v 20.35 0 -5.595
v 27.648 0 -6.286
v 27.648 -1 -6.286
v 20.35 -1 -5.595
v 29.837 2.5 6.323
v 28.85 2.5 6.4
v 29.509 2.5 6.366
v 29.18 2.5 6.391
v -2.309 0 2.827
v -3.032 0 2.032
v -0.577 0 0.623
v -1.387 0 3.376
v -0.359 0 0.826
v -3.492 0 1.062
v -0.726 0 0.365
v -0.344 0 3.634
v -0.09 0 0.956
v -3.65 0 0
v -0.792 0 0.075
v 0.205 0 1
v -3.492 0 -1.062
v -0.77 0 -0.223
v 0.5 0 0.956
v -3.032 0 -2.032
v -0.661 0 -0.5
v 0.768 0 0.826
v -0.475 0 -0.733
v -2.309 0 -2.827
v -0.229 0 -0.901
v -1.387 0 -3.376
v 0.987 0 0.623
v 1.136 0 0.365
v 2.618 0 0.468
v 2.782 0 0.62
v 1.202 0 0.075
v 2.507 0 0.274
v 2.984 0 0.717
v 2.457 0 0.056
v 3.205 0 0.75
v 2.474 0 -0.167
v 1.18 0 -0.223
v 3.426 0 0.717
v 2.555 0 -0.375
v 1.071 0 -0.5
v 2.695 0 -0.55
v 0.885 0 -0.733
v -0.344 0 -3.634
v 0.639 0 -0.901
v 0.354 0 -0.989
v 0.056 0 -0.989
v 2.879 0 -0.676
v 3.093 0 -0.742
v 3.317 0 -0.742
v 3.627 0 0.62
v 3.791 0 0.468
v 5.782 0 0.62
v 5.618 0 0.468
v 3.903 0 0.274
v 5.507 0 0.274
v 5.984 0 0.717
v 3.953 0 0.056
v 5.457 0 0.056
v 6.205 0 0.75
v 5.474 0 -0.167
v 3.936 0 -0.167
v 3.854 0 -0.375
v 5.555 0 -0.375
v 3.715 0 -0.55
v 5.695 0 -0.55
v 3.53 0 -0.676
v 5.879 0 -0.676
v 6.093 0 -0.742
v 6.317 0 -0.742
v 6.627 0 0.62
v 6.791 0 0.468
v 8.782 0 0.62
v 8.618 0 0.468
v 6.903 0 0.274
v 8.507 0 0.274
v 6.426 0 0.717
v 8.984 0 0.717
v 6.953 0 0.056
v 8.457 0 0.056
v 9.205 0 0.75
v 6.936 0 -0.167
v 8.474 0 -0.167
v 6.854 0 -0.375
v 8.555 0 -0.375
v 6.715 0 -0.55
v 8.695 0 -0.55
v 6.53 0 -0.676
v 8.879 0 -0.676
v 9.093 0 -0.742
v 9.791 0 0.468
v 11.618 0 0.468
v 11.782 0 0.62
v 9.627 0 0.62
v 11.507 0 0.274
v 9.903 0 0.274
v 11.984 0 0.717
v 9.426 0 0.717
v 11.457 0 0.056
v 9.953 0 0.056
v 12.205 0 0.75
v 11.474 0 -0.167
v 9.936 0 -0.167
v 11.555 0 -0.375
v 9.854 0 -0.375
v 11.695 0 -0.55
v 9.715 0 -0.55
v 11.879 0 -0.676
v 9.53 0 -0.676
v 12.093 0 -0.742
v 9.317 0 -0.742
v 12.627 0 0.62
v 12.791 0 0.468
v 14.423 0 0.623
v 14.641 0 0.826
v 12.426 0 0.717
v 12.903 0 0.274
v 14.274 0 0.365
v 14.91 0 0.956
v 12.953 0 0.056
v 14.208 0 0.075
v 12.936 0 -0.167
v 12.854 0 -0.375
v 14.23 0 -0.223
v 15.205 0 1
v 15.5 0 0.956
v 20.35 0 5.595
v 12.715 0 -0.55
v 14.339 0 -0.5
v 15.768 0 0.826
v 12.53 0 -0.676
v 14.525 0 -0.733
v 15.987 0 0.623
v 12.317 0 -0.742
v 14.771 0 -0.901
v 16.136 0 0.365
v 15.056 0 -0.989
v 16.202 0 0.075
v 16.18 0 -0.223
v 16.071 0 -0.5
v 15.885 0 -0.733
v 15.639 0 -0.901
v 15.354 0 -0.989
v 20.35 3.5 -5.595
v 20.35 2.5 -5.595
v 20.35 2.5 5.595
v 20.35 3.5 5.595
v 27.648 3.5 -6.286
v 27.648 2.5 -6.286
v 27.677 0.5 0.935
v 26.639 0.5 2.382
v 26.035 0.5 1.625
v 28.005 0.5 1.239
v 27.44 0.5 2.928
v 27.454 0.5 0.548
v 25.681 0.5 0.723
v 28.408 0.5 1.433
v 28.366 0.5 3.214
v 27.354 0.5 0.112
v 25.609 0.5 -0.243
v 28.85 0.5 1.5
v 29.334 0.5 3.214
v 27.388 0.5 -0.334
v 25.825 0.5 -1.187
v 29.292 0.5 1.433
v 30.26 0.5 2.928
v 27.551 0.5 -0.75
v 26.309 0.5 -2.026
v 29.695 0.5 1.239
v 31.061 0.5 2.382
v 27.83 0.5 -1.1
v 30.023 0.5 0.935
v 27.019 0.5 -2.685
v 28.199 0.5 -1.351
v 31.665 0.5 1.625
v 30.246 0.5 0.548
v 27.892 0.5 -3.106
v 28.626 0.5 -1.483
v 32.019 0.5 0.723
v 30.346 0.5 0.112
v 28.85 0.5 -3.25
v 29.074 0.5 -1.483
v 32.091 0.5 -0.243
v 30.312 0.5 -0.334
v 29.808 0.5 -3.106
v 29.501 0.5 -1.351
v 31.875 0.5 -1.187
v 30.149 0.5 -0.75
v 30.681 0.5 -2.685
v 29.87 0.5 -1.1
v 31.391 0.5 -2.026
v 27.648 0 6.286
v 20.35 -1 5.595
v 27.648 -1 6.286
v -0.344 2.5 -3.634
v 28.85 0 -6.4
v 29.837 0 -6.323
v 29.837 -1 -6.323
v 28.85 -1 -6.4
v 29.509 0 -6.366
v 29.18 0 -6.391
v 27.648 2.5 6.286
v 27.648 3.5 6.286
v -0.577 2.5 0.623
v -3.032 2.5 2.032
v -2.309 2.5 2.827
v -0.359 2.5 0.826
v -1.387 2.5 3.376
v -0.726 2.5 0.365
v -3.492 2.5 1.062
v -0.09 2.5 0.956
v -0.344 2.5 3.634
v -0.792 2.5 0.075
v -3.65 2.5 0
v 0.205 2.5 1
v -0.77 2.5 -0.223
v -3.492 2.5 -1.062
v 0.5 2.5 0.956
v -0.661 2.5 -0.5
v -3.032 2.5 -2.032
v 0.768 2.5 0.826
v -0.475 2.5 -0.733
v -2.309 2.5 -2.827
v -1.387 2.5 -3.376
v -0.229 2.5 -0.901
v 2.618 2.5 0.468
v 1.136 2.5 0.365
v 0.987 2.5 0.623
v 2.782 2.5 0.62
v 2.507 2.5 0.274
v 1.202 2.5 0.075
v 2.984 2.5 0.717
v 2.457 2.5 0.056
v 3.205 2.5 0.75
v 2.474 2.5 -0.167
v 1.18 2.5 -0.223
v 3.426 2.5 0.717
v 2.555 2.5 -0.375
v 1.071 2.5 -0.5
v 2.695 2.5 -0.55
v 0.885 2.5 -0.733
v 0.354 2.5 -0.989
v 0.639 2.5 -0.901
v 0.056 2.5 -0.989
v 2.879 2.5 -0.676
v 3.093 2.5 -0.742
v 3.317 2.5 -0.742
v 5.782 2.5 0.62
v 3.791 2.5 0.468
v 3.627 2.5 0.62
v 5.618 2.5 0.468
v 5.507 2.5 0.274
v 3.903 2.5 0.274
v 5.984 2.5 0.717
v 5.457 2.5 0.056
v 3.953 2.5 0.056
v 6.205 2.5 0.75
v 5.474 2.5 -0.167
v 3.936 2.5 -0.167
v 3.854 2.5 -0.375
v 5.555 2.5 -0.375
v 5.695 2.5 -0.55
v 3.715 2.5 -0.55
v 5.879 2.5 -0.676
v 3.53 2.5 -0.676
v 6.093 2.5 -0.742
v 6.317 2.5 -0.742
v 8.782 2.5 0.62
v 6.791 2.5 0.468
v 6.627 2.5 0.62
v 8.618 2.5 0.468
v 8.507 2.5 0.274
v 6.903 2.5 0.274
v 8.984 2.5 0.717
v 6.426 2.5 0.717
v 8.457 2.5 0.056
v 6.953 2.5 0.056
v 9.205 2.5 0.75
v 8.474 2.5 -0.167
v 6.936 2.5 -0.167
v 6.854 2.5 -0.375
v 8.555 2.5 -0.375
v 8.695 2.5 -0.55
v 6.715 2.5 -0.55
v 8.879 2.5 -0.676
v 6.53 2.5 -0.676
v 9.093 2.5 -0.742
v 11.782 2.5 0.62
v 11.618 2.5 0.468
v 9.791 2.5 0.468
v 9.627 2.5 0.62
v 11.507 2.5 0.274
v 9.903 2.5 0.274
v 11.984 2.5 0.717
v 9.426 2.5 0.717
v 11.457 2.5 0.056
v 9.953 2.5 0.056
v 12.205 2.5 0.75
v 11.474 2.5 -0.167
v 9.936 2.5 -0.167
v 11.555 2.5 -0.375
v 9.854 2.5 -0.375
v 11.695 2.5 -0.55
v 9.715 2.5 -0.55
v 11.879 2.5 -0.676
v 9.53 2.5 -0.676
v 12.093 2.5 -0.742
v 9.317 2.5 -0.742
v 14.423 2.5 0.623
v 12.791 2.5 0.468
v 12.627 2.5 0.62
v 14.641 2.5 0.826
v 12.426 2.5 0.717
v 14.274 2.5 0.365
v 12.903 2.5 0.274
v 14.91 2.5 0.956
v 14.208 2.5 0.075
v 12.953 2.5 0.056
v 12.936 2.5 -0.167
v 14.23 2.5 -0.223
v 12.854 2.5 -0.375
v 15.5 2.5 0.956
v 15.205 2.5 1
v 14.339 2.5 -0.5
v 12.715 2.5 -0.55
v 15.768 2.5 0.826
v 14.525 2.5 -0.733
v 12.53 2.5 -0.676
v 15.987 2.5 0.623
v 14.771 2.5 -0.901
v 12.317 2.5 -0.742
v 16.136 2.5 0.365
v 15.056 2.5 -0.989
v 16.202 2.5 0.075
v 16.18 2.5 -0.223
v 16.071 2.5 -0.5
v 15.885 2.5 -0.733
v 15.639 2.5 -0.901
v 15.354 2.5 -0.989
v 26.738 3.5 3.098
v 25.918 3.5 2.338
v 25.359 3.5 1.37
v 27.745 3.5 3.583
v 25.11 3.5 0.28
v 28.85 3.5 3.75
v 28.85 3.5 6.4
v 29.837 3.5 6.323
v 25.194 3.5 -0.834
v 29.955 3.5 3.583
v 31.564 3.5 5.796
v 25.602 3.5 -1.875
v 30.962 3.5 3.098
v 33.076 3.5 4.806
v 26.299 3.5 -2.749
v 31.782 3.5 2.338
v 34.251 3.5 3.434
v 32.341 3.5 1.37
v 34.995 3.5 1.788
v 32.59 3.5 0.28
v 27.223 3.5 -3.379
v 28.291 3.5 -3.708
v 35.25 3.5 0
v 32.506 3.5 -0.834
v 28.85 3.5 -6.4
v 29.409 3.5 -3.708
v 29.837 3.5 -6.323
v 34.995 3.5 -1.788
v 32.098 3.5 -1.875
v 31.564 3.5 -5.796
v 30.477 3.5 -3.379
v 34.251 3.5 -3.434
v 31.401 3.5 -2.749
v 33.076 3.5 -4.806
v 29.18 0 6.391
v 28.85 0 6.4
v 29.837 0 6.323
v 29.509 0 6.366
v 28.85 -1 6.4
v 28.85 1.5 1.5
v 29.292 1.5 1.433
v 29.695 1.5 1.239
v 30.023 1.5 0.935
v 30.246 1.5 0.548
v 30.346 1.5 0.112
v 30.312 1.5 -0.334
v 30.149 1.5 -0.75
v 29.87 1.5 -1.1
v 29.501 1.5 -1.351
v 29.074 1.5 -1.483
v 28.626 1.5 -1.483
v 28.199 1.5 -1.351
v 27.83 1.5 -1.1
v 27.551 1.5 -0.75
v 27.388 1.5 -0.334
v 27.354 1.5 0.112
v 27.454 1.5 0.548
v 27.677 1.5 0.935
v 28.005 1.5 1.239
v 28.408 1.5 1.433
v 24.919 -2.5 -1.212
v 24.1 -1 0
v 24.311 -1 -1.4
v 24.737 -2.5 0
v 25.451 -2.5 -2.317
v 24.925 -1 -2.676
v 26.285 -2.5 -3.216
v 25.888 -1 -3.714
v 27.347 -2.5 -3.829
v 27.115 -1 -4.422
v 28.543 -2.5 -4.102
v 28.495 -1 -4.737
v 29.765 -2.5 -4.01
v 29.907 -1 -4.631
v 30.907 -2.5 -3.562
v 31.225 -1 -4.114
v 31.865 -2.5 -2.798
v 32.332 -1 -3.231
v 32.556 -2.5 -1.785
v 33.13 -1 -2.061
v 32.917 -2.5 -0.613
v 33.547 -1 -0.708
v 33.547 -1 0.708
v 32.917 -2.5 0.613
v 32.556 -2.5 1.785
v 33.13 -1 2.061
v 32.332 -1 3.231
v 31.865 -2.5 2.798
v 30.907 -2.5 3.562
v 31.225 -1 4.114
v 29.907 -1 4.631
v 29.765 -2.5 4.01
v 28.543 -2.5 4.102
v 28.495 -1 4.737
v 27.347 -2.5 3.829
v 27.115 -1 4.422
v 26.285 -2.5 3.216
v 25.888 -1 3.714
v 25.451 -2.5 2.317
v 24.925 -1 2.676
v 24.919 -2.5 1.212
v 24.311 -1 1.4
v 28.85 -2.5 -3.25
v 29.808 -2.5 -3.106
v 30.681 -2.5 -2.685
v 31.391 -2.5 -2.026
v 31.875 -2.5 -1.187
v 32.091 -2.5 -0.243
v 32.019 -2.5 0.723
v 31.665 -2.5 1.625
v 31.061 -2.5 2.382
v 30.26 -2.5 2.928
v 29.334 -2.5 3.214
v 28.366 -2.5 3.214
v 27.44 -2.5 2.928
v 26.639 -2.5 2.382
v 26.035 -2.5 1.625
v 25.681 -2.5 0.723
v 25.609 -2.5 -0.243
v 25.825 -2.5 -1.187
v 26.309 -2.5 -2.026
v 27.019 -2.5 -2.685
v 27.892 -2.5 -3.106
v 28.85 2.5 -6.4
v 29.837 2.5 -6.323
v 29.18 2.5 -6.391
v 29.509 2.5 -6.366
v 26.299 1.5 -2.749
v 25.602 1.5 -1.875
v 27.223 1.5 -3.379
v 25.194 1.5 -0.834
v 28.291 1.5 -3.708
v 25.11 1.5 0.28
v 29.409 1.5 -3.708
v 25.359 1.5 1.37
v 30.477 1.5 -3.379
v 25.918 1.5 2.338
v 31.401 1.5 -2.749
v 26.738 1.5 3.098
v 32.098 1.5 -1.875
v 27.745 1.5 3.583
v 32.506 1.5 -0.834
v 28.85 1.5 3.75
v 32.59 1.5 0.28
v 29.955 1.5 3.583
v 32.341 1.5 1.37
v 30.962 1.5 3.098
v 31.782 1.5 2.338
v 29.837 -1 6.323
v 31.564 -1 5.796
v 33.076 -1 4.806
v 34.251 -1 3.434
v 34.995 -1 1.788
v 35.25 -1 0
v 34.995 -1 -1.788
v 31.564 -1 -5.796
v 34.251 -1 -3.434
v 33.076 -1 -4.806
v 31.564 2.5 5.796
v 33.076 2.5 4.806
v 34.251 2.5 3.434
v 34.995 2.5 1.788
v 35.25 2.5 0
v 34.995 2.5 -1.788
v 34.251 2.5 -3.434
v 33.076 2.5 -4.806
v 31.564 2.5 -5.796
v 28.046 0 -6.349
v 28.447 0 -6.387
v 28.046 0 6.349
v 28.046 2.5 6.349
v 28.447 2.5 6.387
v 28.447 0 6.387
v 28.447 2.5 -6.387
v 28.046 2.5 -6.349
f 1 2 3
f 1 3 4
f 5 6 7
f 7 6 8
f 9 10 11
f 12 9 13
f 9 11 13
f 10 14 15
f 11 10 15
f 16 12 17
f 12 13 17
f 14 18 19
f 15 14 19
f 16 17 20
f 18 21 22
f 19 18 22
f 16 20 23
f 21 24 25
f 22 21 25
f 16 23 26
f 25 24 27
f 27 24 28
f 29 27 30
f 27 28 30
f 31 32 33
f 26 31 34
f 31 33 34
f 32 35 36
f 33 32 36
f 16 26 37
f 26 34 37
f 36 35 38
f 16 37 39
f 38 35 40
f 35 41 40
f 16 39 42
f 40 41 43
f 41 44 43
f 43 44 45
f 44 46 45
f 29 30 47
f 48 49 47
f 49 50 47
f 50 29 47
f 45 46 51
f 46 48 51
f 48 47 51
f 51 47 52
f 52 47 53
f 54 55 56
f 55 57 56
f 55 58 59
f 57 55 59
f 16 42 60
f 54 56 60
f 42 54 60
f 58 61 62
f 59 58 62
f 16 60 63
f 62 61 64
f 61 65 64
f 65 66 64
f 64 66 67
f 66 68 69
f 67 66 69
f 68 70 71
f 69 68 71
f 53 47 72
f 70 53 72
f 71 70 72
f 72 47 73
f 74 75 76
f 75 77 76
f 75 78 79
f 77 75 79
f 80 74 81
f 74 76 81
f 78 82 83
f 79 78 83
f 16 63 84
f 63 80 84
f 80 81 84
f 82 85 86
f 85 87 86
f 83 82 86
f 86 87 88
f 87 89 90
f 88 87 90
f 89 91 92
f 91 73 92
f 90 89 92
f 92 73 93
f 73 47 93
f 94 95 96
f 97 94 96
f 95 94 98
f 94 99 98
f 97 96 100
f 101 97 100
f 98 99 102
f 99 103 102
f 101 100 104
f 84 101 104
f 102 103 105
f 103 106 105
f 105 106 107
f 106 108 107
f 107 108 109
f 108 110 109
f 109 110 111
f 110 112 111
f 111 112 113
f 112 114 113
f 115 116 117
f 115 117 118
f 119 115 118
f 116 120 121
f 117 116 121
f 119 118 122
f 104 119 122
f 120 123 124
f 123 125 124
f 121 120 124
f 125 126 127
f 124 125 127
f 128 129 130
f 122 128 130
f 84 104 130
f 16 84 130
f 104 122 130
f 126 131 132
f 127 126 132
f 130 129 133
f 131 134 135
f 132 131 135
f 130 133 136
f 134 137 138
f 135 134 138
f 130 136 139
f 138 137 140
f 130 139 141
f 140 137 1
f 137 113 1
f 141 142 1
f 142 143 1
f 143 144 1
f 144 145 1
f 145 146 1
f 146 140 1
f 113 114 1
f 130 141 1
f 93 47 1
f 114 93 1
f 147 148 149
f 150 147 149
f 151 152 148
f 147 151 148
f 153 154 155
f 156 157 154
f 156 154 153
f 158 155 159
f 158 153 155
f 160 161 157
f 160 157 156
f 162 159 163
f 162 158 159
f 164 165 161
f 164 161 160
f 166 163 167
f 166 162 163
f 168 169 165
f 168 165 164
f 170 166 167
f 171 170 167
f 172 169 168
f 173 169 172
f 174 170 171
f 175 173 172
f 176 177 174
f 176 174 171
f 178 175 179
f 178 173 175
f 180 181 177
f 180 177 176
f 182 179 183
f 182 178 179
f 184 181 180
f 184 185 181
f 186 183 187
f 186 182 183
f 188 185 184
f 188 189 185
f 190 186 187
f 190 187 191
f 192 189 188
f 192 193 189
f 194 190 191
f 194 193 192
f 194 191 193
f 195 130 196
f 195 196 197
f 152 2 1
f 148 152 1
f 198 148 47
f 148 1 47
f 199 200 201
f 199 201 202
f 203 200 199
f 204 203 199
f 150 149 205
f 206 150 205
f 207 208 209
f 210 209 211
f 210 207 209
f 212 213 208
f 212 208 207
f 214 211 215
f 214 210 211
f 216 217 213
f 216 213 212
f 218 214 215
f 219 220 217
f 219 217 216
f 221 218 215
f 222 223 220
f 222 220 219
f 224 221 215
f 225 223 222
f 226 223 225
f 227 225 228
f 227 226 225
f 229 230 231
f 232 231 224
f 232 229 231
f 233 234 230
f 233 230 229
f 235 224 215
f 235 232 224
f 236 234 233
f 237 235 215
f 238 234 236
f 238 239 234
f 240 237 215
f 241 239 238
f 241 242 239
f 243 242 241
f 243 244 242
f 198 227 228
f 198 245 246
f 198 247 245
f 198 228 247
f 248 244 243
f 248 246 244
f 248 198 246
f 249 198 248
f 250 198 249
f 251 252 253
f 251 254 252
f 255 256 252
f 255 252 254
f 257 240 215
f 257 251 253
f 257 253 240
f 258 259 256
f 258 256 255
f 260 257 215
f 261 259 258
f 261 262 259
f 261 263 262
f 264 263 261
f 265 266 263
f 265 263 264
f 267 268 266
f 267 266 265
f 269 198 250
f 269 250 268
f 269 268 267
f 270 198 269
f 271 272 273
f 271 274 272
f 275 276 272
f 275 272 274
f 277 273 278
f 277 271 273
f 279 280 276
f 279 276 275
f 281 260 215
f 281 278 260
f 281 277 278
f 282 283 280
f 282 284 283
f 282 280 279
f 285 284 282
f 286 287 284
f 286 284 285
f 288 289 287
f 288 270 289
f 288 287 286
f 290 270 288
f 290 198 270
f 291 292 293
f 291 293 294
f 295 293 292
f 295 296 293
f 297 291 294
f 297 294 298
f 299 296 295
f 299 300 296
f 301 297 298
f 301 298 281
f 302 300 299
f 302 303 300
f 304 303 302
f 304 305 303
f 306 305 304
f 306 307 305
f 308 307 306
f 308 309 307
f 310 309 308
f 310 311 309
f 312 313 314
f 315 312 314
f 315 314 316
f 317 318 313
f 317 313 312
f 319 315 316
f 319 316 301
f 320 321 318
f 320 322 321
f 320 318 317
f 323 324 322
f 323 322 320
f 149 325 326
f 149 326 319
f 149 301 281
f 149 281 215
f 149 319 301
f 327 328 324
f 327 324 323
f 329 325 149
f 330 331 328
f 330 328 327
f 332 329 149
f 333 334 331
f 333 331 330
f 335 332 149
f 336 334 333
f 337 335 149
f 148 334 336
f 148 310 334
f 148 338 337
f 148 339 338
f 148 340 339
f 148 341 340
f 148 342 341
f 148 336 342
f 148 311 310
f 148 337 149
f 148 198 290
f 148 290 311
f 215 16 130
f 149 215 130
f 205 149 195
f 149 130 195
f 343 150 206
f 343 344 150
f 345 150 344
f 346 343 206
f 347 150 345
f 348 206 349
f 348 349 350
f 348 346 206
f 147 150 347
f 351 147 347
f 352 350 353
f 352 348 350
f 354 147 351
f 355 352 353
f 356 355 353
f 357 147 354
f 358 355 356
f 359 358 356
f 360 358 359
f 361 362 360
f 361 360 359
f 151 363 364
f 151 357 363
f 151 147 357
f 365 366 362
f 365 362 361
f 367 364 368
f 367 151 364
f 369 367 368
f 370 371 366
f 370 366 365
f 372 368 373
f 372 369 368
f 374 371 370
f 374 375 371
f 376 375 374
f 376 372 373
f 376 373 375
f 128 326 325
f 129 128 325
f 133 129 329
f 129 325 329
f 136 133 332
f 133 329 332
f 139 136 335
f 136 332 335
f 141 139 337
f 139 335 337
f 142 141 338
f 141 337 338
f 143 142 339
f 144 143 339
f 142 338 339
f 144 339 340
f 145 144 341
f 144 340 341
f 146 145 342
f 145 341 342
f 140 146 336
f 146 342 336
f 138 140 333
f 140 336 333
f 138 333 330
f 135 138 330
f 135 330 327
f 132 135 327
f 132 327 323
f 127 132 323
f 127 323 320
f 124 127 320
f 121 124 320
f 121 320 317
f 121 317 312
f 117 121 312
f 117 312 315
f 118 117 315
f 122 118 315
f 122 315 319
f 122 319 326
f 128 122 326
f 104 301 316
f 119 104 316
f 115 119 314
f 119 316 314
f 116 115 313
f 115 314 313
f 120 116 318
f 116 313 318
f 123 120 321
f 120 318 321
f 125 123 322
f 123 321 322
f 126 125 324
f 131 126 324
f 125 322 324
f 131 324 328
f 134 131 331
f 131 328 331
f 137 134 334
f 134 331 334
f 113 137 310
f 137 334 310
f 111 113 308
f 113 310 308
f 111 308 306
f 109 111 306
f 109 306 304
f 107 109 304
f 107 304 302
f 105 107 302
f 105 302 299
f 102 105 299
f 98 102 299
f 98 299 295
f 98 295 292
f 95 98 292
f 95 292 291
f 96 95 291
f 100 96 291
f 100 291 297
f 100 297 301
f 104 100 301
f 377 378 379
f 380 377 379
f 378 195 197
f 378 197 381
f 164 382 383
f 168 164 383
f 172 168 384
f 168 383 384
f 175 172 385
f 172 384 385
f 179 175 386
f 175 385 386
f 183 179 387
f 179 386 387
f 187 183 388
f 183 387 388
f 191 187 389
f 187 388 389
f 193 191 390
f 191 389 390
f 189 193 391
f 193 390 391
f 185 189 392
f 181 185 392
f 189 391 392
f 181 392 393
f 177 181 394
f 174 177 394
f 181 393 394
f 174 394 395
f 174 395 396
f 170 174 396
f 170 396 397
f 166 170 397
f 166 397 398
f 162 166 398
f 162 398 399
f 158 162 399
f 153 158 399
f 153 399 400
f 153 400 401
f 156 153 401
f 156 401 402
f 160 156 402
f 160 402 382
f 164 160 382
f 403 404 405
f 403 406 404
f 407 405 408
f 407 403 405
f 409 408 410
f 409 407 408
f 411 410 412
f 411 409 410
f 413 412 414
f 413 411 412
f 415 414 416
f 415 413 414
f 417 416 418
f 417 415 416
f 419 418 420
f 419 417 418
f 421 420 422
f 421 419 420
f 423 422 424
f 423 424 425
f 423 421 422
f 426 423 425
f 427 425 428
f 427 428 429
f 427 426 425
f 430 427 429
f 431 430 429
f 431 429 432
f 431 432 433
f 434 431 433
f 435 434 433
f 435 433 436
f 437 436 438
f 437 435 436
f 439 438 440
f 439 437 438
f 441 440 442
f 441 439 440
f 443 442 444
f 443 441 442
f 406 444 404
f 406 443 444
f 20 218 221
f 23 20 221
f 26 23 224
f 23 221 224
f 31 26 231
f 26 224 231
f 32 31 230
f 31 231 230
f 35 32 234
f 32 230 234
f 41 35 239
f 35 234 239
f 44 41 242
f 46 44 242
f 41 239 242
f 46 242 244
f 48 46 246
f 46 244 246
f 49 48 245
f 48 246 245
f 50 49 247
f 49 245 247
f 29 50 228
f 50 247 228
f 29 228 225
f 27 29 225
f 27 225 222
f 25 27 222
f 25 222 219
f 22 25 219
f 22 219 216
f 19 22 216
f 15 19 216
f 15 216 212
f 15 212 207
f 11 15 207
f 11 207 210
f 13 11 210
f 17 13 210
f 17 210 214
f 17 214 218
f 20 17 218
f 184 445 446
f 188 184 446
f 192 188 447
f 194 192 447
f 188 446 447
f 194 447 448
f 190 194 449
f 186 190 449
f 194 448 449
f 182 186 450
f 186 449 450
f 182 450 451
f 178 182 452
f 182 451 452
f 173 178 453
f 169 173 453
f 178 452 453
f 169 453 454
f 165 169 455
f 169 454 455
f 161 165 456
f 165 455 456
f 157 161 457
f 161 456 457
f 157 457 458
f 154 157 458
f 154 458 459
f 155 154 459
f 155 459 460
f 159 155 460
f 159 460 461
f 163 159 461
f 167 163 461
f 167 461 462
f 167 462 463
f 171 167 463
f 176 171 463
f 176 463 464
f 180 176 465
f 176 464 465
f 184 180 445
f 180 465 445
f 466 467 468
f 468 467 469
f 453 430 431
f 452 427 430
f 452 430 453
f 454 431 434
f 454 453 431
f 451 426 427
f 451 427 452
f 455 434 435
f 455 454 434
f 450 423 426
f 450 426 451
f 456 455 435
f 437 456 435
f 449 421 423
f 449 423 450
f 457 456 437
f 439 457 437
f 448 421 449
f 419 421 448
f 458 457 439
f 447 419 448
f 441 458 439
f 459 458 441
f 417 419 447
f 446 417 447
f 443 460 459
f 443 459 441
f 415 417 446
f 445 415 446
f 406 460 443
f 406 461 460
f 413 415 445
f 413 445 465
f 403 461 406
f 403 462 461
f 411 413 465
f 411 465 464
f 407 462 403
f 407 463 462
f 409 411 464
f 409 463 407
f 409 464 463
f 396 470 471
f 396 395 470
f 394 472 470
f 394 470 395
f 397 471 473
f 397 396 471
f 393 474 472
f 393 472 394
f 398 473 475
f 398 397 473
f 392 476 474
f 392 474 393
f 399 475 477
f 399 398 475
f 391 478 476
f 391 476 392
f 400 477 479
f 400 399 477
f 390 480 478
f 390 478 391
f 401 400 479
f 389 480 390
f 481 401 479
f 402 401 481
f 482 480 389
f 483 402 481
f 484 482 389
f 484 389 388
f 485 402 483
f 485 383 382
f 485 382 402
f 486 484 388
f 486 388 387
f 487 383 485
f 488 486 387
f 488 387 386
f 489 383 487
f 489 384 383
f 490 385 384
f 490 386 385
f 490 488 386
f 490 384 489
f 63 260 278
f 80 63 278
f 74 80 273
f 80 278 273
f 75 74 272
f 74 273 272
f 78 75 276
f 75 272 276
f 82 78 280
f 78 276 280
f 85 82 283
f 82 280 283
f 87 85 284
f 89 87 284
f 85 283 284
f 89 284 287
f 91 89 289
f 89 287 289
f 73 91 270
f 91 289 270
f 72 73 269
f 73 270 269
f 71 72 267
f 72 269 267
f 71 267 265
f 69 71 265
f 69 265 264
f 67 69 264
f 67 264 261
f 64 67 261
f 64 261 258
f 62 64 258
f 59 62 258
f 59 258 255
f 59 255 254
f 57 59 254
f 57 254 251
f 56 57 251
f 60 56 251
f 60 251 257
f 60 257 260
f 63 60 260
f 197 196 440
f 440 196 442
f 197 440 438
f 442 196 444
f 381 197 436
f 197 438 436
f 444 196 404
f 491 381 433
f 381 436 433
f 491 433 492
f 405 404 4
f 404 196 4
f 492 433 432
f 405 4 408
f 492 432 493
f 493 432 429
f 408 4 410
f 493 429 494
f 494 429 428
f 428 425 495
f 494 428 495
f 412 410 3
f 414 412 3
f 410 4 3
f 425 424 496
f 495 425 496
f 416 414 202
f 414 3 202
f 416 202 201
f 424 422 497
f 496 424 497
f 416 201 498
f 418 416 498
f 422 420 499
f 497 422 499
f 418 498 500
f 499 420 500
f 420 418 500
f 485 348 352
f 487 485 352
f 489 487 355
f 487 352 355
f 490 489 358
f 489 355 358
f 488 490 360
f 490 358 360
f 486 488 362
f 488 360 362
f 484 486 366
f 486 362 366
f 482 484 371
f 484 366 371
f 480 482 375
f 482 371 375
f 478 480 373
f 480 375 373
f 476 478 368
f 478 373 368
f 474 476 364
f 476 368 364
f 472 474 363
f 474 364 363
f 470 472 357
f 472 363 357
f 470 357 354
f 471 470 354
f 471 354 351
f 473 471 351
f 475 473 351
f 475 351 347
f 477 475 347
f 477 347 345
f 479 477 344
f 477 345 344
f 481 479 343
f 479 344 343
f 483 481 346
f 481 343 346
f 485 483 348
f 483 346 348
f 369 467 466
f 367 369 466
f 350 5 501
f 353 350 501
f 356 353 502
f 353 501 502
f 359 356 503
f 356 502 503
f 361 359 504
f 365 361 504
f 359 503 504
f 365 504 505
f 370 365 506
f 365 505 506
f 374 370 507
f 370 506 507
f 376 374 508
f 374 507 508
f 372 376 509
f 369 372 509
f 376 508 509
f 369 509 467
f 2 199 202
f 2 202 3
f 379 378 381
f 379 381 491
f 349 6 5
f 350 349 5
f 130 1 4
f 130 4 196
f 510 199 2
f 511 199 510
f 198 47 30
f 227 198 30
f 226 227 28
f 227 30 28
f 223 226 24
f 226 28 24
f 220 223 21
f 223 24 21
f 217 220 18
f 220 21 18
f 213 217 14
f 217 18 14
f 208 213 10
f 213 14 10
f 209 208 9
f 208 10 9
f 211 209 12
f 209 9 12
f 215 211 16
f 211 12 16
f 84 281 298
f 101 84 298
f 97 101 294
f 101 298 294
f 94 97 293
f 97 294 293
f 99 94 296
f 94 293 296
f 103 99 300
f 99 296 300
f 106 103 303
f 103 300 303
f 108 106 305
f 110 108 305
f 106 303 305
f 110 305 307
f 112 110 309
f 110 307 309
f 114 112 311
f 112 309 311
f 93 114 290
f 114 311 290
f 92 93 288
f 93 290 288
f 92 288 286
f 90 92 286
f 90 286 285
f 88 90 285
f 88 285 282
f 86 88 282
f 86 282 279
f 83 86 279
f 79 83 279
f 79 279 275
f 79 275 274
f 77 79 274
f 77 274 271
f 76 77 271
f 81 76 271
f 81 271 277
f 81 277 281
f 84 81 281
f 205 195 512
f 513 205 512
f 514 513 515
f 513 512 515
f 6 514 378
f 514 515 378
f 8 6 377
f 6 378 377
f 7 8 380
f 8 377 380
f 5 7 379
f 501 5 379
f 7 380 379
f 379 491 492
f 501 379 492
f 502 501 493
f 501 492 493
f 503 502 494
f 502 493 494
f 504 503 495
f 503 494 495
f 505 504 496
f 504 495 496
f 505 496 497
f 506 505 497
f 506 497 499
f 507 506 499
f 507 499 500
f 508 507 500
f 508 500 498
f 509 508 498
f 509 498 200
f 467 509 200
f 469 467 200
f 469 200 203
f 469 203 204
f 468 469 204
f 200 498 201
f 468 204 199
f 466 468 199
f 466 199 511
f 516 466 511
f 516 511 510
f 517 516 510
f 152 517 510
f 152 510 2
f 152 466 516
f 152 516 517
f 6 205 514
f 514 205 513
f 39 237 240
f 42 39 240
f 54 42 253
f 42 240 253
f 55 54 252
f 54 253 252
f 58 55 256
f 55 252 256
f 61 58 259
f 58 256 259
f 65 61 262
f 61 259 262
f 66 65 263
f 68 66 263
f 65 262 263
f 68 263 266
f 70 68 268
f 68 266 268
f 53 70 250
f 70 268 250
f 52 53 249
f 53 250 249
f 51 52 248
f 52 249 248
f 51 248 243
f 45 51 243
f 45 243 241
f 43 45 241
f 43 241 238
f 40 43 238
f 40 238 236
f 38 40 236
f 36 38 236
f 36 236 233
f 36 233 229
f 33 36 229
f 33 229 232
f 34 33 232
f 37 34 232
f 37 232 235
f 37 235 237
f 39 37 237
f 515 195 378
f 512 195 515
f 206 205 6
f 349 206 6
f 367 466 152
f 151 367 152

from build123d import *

# Parameters (mm, degrees)
EXTRUDE_1_DEPTH      = 2.5
EXTRUDE_2_DEPTH      = 1
EXTRUDE_2_DEPTH_BACK = 3.5
SKETCH_4_R           = 1.5
CUT_EXTRUDE_1_DEPTH  = 14.5
SKETCH_7_R           = 1
SKETCH_7_R_2         = 0.75
CUT_EXTRUDE_4_DEPTH  = 3
SKETCH_8_R           = 4.75
EXTRUDE_3_DEPTH      = 1.5
EXTRUDE_3_TAPER      = 23
SKETCH_9_R           = 3.25
CUT_EXTRUDE_5_DEPTH  = 3
SKETCH_10_R          = 3.75
CUT_EXTRUDE_6_DEPTH  = 2


with BuildPart() as part:
    # ｽｹｯﾁ1 → ﾎﾞｽ - 押し出し1 (new body)
    with BuildSketch(Plane(origin=(0, 0, 0), x_dir=(1, 0, 0), z_dir=(0, 1, 0))):
        with BuildLine():
            Line((27.647942003, 6.286100267), (-0.344309679, 3.633724101))
            ThreePointArc((-0.344309679, 3.633724101), (-3.65, 0), (-0.344309679, -3.633724101))
            Line((-0.344309679, -3.633724101), (27.647942003, -6.286100267))
            ThreePointArc((27.647942003, -6.286100267), (35.25, 0), (27.647942003, 6.286100267))
        make_face()
    extrude(amount=EXTRUDE_1_DEPTH)

    # ｽｹｯﾁ2 → ﾎﾞｽ - 押し出し2 (add, two sides)
    with BuildSketch(Plane(origin=(0, 2.5, 0), x_dir=(1, 0, 0), z_dir=(0, 1, 0))) as extrude_2_sk:
        with BuildLine():
            Line((27.647942003, 6.286100267), (20.35, 5.594591501))
            Line((20.35, 5.594591501), (20.35, -5.594591501))
            Line((20.35, -5.594591501), (27.647942003, -6.286100267))
            Line((27.647942003, -6.286100267), (28.85, -6.4))
            Line((28.85, -6.4), (29.836801685, -6.323466014))
            ThreePointArc((29.836801685, -6.323466014), (35.25, 0), (29.836801685, 6.323466014))
            Line((29.836801685, 6.323466014), (28.85, 6.4))
            Line((28.85, 6.4), (27.647942003, 6.286100267))
        make_face()
    extrude(amount=EXTRUDE_2_DEPTH)
    extrude(extrude_2_sk.sketch, amount=-EXTRUDE_2_DEPTH_BACK)

    # ｽｹｯﾁ4 → ｶｯﾄ - 押し出し1 (cut)
    with BuildSketch(Plane(origin=(0, 3.5, 0), x_dir=(1, 0, 0), z_dir=(0, 1, 0))):
        with Locations(Location((28.85, 0, 0), (0, 0, 270))):
            Circle(SKETCH_4_R)
    extrude(amount=-CUT_EXTRUDE_1_DEPTH, mode=Mode.SUBTRACT)

    # ｽｹｯﾁ7 → ｶｯﾄ - 押し出し4 (cut)
    with BuildSketch(Plane(origin=(0, 2.5, 0), x_dir=(1, 0, 0), z_dir=(0, 1, 0))):
        with Locations((57.7, 0)):
            Circle(SKETCH_7_R)
        with Locations(Location((15.204795613, 0, 0), (0, 0, 270))):
            Circle(SKETCH_7_R)
        with Locations((54.7, 0)):
            Circle(SKETCH_7_R)
        with Locations((51.7, 0)):
            Circle(SKETCH_7_R)
        with Locations((48.7, 0)):
            Circle(SKETCH_7_R)
        with Locations((45.7, 0)):
            Circle(SKETCH_7_R)
        with Locations(Location((12.204795613, 0, 0), (0, 0, 270))):
            Circle(SKETCH_7_R_2)
        with Locations(Location((9.204795613, 0, 0), (0, 0, 270))):
            Circle(SKETCH_7_R_2)
        with Locations(Location((6.204795613, 0, 0), (0, 0, 270))):
            Circle(SKETCH_7_R_2)
        with Locations(Location((3.204795613, 0, 0), (0, 0, 270))):
            Circle(SKETCH_7_R_2)
        with Locations(Location((0.204795613, 0, 0), (0, 0, 270))):
            Circle(SKETCH_7_R)
    extrude(amount=-CUT_EXTRUDE_4_DEPTH, mode=Mode.SUBTRACT)

    # ｽｹｯﾁ8 → ﾎﾞｽ - 押し出し3 (add)
    with BuildSketch(Plane(origin=(0, -1, 0), x_dir=(-1, 0, 0), z_dir=(0, -1, 0))):
        with Locations((-28.85, 0)):
            Circle(SKETCH_8_R)
    extrude(amount=EXTRUDE_3_DEPTH, taper=EXTRUDE_3_TAPER)

    # ｽｹｯﾁ9 → ｶｯﾄ - 押し出し5 (cut)
    with BuildSketch(Plane(origin=(0, -2.5, 0), x_dir=(-1, 0, 0), z_dir=(0, -1, 0))):
        with Locations(Location((-28.85, 0, 0), (0, 0, 90))):
            Circle(SKETCH_9_R)
    extrude(amount=-CUT_EXTRUDE_5_DEPTH, mode=Mode.SUBTRACT)

    # ｽｹｯﾁ10 → ｶｯﾄ - 押し出し6 (cut)
    with BuildSketch(Plane(origin=(0, 3.5, 0), x_dir=(1, 0, 0), z_dir=(0, 1, 0))):
        with Locations(Location((28.85, 0, 0), (0, 0, 270))):
            Circle(SKETCH_10_R)
    extrude(amount=-CUT_EXTRUDE_6_DEPTH, mode=Mode.SUBTRACT)


solid = part.part
